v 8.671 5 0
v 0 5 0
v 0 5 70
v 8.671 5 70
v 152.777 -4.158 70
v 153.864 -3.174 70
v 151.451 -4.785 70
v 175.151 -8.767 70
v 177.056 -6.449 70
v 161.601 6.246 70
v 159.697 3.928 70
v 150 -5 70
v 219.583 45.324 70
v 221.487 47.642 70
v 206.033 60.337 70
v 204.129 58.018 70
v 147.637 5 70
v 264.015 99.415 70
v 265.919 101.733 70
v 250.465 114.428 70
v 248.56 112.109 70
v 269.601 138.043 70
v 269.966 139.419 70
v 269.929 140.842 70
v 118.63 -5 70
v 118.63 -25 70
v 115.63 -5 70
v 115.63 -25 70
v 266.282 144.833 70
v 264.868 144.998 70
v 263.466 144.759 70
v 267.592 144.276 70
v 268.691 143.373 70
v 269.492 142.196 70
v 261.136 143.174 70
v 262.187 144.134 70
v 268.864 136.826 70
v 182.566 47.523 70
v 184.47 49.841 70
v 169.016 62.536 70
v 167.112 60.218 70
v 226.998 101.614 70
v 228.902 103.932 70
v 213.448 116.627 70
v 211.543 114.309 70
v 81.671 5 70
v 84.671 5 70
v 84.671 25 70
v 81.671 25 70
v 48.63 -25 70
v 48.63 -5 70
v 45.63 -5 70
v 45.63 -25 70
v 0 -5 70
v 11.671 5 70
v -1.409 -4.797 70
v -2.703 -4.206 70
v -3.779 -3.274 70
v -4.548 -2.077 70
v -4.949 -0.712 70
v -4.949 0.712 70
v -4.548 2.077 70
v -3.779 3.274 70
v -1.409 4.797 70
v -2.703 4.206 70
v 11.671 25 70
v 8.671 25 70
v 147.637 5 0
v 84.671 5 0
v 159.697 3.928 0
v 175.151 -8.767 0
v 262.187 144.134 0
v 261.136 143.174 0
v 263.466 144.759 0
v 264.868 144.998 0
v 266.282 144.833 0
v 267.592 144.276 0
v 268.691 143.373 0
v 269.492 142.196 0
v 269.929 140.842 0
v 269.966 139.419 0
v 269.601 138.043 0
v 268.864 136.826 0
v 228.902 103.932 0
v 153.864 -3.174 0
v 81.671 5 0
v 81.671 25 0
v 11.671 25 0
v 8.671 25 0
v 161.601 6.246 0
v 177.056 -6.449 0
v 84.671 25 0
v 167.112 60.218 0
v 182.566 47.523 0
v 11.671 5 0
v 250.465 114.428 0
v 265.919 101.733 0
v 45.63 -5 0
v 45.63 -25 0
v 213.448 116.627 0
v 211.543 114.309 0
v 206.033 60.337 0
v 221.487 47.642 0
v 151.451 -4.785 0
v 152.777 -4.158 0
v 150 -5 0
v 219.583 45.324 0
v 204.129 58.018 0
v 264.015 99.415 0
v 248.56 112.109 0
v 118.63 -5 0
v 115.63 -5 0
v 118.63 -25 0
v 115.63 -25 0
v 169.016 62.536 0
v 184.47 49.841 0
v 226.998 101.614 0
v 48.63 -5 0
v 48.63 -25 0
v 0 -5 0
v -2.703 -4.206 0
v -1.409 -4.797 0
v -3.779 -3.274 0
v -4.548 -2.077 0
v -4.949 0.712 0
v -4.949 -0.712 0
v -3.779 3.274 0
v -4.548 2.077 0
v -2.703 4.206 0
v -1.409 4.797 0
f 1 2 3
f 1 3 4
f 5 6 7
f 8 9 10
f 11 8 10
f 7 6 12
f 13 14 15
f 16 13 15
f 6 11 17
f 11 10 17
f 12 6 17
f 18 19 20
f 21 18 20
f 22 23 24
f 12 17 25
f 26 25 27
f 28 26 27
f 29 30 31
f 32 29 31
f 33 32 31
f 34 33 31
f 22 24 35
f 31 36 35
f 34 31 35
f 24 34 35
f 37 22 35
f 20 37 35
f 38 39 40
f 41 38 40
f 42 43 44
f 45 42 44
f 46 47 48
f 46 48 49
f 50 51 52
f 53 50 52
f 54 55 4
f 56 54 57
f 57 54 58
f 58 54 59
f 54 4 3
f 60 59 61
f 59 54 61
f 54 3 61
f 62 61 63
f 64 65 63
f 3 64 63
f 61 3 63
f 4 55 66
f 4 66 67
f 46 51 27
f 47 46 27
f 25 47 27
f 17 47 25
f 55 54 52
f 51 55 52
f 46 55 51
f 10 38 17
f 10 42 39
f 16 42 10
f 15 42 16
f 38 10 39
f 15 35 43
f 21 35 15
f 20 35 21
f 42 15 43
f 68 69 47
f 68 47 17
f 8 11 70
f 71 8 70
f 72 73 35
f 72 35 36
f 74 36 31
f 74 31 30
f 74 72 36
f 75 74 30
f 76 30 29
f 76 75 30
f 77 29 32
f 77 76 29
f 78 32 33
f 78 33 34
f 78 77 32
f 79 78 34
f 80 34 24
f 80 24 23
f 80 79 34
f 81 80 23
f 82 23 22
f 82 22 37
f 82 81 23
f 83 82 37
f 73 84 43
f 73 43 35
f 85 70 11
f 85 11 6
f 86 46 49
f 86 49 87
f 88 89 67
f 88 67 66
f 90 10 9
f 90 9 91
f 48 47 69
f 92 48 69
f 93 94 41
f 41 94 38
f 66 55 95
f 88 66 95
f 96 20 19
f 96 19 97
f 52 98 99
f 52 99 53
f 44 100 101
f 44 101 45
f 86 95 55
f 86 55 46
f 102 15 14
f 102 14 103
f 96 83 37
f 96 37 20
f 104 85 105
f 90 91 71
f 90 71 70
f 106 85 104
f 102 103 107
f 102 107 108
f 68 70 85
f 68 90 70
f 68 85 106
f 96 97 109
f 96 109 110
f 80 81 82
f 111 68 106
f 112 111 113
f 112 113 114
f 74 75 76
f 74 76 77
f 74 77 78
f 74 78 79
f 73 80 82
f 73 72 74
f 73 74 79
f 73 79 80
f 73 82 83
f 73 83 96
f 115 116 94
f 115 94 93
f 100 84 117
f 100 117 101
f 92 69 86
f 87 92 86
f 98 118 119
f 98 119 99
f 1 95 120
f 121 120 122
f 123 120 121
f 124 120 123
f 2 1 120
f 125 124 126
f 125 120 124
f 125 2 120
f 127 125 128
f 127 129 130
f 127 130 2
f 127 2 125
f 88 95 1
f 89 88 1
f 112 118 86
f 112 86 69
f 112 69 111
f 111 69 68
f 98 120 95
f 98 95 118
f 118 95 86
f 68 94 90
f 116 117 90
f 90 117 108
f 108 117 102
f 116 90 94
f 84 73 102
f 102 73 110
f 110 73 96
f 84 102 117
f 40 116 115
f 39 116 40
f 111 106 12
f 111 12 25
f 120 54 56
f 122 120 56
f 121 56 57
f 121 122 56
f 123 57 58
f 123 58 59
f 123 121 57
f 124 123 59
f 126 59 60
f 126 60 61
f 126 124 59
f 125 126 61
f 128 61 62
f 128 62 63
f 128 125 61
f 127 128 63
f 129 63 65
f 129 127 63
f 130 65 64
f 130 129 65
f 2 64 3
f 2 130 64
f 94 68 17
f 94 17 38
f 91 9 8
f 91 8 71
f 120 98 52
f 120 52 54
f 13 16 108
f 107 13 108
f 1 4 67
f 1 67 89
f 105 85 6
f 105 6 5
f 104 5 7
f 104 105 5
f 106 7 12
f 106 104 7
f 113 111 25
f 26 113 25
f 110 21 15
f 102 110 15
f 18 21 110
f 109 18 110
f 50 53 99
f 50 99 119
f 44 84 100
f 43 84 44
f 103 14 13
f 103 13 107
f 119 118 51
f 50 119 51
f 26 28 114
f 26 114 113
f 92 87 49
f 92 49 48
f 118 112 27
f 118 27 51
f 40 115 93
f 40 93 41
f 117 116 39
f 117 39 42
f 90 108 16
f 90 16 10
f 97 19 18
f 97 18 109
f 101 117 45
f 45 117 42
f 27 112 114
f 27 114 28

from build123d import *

# Parameters (mm, degrees)
BOSS_EXTRUDE1_DEPTH = 70
SKETCH2_W           = 3
SKETCH2_H           = 70
BOSS_EXTRUDE2_DEPTH = 20
LPATTERN2_COUNT     = 2
LPATTERN2_PITCH     = 73
SKETCH3_W           = 70
SKETCH3_H           = 3
BOSS_EXTRUDE3_DEPTH = 20
LPATTERN3_COUNT     = 2
LPATTERN3_PITCH     = 70
SKETCH6_W           = 3
SKETCH6_H           = 70
BOSS_EXTRUDE4_DEPTH = 20
LPATTERN4_COUNT     = 2
LPATTERN4_PITCH     = 70
SKETCH8_W           = 70
SKETCH8_H           = 3
BOSS_EXTRUDE5_DEPTH = 20
LPATTERN5_COUNT     = 3
LPATTERN5_PITCH     = 70


with BuildPart() as part:
    # Sketch1 → Boss-Extrude1 (new body)
    with BuildSketch(Plane.XY):
        with BuildLine():
            Line((150, -5), (0, -5))
            ThreePointArc((0, -5), (-5, 0), (0, 5))
            Line((0, 5), (147.636546096, 5))
            Line((147.636546096, 5), (261.136368727, 143.173697117))
            ThreePointArc((261.136368727, 143.173697117), (268.173697117, 143.863631273), (268.863631273, 136.826302883))
            Line((268.863631273, 136.826302883), (153.863631273, -3.173697117))
            ThreePointArc((153.863631273, -3.173697117), (152.136763255, -4.520425068), (150, -5))
        make_face()
    extrude(amount=BOSS_EXTRUDE1_DEPTH)

    # Sketch2 → Boss-Extrude2 (add)
    with BuildSketch(Plane(origin=(0, 5, 0), x_dir=(1, 0, 0), z_dir=(0, 1, 0))):
        with Locations((10.170720814, -35)):
            Rectangle(SKETCH2_W, SKETCH2_H)
    boss_extrude2 = extrude(amount=BOSS_EXTRUDE2_DEPTH)

    # LPattern2: Boss-Extrude2 ×2
    with Locations(*[(i * LPATTERN2_PITCH, 0, 0) for i in range(1, LPATTERN2_COUNT)]):
        add(boss_extrude2)

    # Sketch3 → Boss-Extrude3 (add)
    with BuildSketch(Plane(origin=(85.702248392, -70.398275465, 0), x_dir=(0, 0, 1), z_dir=(-0.7727262545252344, 0.6347394233600138, 0))):
        with Locations((35, 154.104367408)):
            Rectangle(SKETCH3_W, SKETCH3_H)
    boss_extrude3 = extrude(amount=BOSS_EXTRUDE3_DEPTH)

    # LPattern3: Boss-Extrude3 ×2
    with Locations(*[Vector(0.6347394233600139, 0.7727262545252342, 0) * (i * LPATTERN3_PITCH) for i in range(1, LPATTERN3_COUNT)]):
        add(boss_extrude3)

    # Sketch6 → Boss-Extrude4 (add)
    with BuildSketch(Plane.XZ.offset(5)):
        with Locations((47.13, 35)):
            Rectangle(SKETCH6_W, SKETCH6_H)
    boss_extrude4 = extrude(amount=BOSS_EXTRUDE4_DEPTH)

    # LPattern4: Boss-Extrude4 ×2
    with Locations(*[(i * LPATTERN4_PITCH, 0, 0) for i in range(1, LPATTERN4_COUNT)]):
        add(boss_extrude4)

    # Sketch8 → Boss-Extrude5 (add)
    with BuildSketch(Plane(origin=(93.429510938, -76.745669699, 0), x_dir=(0, 0, -1), z_dir=(0.7727262545252342, -0.6347394233600141, 0))):
        with Locations((-35, 105.900913504)):
            Rectangle(SKETCH8_W, SKETCH8_H)
    boss_extrude5 = extrude(amount=BOSS_EXTRUDE5_DEPTH)

    # LPattern5: Boss-Extrude5 ×3
    with Locations(*[Vector(0.6347394233600141, 0.7727262545252341, 0) * (i * LPATTERN5_PITCH) for i in range(1, LPATTERN5_COUNT)]):
        add(boss_extrude5)


solid = part.part
